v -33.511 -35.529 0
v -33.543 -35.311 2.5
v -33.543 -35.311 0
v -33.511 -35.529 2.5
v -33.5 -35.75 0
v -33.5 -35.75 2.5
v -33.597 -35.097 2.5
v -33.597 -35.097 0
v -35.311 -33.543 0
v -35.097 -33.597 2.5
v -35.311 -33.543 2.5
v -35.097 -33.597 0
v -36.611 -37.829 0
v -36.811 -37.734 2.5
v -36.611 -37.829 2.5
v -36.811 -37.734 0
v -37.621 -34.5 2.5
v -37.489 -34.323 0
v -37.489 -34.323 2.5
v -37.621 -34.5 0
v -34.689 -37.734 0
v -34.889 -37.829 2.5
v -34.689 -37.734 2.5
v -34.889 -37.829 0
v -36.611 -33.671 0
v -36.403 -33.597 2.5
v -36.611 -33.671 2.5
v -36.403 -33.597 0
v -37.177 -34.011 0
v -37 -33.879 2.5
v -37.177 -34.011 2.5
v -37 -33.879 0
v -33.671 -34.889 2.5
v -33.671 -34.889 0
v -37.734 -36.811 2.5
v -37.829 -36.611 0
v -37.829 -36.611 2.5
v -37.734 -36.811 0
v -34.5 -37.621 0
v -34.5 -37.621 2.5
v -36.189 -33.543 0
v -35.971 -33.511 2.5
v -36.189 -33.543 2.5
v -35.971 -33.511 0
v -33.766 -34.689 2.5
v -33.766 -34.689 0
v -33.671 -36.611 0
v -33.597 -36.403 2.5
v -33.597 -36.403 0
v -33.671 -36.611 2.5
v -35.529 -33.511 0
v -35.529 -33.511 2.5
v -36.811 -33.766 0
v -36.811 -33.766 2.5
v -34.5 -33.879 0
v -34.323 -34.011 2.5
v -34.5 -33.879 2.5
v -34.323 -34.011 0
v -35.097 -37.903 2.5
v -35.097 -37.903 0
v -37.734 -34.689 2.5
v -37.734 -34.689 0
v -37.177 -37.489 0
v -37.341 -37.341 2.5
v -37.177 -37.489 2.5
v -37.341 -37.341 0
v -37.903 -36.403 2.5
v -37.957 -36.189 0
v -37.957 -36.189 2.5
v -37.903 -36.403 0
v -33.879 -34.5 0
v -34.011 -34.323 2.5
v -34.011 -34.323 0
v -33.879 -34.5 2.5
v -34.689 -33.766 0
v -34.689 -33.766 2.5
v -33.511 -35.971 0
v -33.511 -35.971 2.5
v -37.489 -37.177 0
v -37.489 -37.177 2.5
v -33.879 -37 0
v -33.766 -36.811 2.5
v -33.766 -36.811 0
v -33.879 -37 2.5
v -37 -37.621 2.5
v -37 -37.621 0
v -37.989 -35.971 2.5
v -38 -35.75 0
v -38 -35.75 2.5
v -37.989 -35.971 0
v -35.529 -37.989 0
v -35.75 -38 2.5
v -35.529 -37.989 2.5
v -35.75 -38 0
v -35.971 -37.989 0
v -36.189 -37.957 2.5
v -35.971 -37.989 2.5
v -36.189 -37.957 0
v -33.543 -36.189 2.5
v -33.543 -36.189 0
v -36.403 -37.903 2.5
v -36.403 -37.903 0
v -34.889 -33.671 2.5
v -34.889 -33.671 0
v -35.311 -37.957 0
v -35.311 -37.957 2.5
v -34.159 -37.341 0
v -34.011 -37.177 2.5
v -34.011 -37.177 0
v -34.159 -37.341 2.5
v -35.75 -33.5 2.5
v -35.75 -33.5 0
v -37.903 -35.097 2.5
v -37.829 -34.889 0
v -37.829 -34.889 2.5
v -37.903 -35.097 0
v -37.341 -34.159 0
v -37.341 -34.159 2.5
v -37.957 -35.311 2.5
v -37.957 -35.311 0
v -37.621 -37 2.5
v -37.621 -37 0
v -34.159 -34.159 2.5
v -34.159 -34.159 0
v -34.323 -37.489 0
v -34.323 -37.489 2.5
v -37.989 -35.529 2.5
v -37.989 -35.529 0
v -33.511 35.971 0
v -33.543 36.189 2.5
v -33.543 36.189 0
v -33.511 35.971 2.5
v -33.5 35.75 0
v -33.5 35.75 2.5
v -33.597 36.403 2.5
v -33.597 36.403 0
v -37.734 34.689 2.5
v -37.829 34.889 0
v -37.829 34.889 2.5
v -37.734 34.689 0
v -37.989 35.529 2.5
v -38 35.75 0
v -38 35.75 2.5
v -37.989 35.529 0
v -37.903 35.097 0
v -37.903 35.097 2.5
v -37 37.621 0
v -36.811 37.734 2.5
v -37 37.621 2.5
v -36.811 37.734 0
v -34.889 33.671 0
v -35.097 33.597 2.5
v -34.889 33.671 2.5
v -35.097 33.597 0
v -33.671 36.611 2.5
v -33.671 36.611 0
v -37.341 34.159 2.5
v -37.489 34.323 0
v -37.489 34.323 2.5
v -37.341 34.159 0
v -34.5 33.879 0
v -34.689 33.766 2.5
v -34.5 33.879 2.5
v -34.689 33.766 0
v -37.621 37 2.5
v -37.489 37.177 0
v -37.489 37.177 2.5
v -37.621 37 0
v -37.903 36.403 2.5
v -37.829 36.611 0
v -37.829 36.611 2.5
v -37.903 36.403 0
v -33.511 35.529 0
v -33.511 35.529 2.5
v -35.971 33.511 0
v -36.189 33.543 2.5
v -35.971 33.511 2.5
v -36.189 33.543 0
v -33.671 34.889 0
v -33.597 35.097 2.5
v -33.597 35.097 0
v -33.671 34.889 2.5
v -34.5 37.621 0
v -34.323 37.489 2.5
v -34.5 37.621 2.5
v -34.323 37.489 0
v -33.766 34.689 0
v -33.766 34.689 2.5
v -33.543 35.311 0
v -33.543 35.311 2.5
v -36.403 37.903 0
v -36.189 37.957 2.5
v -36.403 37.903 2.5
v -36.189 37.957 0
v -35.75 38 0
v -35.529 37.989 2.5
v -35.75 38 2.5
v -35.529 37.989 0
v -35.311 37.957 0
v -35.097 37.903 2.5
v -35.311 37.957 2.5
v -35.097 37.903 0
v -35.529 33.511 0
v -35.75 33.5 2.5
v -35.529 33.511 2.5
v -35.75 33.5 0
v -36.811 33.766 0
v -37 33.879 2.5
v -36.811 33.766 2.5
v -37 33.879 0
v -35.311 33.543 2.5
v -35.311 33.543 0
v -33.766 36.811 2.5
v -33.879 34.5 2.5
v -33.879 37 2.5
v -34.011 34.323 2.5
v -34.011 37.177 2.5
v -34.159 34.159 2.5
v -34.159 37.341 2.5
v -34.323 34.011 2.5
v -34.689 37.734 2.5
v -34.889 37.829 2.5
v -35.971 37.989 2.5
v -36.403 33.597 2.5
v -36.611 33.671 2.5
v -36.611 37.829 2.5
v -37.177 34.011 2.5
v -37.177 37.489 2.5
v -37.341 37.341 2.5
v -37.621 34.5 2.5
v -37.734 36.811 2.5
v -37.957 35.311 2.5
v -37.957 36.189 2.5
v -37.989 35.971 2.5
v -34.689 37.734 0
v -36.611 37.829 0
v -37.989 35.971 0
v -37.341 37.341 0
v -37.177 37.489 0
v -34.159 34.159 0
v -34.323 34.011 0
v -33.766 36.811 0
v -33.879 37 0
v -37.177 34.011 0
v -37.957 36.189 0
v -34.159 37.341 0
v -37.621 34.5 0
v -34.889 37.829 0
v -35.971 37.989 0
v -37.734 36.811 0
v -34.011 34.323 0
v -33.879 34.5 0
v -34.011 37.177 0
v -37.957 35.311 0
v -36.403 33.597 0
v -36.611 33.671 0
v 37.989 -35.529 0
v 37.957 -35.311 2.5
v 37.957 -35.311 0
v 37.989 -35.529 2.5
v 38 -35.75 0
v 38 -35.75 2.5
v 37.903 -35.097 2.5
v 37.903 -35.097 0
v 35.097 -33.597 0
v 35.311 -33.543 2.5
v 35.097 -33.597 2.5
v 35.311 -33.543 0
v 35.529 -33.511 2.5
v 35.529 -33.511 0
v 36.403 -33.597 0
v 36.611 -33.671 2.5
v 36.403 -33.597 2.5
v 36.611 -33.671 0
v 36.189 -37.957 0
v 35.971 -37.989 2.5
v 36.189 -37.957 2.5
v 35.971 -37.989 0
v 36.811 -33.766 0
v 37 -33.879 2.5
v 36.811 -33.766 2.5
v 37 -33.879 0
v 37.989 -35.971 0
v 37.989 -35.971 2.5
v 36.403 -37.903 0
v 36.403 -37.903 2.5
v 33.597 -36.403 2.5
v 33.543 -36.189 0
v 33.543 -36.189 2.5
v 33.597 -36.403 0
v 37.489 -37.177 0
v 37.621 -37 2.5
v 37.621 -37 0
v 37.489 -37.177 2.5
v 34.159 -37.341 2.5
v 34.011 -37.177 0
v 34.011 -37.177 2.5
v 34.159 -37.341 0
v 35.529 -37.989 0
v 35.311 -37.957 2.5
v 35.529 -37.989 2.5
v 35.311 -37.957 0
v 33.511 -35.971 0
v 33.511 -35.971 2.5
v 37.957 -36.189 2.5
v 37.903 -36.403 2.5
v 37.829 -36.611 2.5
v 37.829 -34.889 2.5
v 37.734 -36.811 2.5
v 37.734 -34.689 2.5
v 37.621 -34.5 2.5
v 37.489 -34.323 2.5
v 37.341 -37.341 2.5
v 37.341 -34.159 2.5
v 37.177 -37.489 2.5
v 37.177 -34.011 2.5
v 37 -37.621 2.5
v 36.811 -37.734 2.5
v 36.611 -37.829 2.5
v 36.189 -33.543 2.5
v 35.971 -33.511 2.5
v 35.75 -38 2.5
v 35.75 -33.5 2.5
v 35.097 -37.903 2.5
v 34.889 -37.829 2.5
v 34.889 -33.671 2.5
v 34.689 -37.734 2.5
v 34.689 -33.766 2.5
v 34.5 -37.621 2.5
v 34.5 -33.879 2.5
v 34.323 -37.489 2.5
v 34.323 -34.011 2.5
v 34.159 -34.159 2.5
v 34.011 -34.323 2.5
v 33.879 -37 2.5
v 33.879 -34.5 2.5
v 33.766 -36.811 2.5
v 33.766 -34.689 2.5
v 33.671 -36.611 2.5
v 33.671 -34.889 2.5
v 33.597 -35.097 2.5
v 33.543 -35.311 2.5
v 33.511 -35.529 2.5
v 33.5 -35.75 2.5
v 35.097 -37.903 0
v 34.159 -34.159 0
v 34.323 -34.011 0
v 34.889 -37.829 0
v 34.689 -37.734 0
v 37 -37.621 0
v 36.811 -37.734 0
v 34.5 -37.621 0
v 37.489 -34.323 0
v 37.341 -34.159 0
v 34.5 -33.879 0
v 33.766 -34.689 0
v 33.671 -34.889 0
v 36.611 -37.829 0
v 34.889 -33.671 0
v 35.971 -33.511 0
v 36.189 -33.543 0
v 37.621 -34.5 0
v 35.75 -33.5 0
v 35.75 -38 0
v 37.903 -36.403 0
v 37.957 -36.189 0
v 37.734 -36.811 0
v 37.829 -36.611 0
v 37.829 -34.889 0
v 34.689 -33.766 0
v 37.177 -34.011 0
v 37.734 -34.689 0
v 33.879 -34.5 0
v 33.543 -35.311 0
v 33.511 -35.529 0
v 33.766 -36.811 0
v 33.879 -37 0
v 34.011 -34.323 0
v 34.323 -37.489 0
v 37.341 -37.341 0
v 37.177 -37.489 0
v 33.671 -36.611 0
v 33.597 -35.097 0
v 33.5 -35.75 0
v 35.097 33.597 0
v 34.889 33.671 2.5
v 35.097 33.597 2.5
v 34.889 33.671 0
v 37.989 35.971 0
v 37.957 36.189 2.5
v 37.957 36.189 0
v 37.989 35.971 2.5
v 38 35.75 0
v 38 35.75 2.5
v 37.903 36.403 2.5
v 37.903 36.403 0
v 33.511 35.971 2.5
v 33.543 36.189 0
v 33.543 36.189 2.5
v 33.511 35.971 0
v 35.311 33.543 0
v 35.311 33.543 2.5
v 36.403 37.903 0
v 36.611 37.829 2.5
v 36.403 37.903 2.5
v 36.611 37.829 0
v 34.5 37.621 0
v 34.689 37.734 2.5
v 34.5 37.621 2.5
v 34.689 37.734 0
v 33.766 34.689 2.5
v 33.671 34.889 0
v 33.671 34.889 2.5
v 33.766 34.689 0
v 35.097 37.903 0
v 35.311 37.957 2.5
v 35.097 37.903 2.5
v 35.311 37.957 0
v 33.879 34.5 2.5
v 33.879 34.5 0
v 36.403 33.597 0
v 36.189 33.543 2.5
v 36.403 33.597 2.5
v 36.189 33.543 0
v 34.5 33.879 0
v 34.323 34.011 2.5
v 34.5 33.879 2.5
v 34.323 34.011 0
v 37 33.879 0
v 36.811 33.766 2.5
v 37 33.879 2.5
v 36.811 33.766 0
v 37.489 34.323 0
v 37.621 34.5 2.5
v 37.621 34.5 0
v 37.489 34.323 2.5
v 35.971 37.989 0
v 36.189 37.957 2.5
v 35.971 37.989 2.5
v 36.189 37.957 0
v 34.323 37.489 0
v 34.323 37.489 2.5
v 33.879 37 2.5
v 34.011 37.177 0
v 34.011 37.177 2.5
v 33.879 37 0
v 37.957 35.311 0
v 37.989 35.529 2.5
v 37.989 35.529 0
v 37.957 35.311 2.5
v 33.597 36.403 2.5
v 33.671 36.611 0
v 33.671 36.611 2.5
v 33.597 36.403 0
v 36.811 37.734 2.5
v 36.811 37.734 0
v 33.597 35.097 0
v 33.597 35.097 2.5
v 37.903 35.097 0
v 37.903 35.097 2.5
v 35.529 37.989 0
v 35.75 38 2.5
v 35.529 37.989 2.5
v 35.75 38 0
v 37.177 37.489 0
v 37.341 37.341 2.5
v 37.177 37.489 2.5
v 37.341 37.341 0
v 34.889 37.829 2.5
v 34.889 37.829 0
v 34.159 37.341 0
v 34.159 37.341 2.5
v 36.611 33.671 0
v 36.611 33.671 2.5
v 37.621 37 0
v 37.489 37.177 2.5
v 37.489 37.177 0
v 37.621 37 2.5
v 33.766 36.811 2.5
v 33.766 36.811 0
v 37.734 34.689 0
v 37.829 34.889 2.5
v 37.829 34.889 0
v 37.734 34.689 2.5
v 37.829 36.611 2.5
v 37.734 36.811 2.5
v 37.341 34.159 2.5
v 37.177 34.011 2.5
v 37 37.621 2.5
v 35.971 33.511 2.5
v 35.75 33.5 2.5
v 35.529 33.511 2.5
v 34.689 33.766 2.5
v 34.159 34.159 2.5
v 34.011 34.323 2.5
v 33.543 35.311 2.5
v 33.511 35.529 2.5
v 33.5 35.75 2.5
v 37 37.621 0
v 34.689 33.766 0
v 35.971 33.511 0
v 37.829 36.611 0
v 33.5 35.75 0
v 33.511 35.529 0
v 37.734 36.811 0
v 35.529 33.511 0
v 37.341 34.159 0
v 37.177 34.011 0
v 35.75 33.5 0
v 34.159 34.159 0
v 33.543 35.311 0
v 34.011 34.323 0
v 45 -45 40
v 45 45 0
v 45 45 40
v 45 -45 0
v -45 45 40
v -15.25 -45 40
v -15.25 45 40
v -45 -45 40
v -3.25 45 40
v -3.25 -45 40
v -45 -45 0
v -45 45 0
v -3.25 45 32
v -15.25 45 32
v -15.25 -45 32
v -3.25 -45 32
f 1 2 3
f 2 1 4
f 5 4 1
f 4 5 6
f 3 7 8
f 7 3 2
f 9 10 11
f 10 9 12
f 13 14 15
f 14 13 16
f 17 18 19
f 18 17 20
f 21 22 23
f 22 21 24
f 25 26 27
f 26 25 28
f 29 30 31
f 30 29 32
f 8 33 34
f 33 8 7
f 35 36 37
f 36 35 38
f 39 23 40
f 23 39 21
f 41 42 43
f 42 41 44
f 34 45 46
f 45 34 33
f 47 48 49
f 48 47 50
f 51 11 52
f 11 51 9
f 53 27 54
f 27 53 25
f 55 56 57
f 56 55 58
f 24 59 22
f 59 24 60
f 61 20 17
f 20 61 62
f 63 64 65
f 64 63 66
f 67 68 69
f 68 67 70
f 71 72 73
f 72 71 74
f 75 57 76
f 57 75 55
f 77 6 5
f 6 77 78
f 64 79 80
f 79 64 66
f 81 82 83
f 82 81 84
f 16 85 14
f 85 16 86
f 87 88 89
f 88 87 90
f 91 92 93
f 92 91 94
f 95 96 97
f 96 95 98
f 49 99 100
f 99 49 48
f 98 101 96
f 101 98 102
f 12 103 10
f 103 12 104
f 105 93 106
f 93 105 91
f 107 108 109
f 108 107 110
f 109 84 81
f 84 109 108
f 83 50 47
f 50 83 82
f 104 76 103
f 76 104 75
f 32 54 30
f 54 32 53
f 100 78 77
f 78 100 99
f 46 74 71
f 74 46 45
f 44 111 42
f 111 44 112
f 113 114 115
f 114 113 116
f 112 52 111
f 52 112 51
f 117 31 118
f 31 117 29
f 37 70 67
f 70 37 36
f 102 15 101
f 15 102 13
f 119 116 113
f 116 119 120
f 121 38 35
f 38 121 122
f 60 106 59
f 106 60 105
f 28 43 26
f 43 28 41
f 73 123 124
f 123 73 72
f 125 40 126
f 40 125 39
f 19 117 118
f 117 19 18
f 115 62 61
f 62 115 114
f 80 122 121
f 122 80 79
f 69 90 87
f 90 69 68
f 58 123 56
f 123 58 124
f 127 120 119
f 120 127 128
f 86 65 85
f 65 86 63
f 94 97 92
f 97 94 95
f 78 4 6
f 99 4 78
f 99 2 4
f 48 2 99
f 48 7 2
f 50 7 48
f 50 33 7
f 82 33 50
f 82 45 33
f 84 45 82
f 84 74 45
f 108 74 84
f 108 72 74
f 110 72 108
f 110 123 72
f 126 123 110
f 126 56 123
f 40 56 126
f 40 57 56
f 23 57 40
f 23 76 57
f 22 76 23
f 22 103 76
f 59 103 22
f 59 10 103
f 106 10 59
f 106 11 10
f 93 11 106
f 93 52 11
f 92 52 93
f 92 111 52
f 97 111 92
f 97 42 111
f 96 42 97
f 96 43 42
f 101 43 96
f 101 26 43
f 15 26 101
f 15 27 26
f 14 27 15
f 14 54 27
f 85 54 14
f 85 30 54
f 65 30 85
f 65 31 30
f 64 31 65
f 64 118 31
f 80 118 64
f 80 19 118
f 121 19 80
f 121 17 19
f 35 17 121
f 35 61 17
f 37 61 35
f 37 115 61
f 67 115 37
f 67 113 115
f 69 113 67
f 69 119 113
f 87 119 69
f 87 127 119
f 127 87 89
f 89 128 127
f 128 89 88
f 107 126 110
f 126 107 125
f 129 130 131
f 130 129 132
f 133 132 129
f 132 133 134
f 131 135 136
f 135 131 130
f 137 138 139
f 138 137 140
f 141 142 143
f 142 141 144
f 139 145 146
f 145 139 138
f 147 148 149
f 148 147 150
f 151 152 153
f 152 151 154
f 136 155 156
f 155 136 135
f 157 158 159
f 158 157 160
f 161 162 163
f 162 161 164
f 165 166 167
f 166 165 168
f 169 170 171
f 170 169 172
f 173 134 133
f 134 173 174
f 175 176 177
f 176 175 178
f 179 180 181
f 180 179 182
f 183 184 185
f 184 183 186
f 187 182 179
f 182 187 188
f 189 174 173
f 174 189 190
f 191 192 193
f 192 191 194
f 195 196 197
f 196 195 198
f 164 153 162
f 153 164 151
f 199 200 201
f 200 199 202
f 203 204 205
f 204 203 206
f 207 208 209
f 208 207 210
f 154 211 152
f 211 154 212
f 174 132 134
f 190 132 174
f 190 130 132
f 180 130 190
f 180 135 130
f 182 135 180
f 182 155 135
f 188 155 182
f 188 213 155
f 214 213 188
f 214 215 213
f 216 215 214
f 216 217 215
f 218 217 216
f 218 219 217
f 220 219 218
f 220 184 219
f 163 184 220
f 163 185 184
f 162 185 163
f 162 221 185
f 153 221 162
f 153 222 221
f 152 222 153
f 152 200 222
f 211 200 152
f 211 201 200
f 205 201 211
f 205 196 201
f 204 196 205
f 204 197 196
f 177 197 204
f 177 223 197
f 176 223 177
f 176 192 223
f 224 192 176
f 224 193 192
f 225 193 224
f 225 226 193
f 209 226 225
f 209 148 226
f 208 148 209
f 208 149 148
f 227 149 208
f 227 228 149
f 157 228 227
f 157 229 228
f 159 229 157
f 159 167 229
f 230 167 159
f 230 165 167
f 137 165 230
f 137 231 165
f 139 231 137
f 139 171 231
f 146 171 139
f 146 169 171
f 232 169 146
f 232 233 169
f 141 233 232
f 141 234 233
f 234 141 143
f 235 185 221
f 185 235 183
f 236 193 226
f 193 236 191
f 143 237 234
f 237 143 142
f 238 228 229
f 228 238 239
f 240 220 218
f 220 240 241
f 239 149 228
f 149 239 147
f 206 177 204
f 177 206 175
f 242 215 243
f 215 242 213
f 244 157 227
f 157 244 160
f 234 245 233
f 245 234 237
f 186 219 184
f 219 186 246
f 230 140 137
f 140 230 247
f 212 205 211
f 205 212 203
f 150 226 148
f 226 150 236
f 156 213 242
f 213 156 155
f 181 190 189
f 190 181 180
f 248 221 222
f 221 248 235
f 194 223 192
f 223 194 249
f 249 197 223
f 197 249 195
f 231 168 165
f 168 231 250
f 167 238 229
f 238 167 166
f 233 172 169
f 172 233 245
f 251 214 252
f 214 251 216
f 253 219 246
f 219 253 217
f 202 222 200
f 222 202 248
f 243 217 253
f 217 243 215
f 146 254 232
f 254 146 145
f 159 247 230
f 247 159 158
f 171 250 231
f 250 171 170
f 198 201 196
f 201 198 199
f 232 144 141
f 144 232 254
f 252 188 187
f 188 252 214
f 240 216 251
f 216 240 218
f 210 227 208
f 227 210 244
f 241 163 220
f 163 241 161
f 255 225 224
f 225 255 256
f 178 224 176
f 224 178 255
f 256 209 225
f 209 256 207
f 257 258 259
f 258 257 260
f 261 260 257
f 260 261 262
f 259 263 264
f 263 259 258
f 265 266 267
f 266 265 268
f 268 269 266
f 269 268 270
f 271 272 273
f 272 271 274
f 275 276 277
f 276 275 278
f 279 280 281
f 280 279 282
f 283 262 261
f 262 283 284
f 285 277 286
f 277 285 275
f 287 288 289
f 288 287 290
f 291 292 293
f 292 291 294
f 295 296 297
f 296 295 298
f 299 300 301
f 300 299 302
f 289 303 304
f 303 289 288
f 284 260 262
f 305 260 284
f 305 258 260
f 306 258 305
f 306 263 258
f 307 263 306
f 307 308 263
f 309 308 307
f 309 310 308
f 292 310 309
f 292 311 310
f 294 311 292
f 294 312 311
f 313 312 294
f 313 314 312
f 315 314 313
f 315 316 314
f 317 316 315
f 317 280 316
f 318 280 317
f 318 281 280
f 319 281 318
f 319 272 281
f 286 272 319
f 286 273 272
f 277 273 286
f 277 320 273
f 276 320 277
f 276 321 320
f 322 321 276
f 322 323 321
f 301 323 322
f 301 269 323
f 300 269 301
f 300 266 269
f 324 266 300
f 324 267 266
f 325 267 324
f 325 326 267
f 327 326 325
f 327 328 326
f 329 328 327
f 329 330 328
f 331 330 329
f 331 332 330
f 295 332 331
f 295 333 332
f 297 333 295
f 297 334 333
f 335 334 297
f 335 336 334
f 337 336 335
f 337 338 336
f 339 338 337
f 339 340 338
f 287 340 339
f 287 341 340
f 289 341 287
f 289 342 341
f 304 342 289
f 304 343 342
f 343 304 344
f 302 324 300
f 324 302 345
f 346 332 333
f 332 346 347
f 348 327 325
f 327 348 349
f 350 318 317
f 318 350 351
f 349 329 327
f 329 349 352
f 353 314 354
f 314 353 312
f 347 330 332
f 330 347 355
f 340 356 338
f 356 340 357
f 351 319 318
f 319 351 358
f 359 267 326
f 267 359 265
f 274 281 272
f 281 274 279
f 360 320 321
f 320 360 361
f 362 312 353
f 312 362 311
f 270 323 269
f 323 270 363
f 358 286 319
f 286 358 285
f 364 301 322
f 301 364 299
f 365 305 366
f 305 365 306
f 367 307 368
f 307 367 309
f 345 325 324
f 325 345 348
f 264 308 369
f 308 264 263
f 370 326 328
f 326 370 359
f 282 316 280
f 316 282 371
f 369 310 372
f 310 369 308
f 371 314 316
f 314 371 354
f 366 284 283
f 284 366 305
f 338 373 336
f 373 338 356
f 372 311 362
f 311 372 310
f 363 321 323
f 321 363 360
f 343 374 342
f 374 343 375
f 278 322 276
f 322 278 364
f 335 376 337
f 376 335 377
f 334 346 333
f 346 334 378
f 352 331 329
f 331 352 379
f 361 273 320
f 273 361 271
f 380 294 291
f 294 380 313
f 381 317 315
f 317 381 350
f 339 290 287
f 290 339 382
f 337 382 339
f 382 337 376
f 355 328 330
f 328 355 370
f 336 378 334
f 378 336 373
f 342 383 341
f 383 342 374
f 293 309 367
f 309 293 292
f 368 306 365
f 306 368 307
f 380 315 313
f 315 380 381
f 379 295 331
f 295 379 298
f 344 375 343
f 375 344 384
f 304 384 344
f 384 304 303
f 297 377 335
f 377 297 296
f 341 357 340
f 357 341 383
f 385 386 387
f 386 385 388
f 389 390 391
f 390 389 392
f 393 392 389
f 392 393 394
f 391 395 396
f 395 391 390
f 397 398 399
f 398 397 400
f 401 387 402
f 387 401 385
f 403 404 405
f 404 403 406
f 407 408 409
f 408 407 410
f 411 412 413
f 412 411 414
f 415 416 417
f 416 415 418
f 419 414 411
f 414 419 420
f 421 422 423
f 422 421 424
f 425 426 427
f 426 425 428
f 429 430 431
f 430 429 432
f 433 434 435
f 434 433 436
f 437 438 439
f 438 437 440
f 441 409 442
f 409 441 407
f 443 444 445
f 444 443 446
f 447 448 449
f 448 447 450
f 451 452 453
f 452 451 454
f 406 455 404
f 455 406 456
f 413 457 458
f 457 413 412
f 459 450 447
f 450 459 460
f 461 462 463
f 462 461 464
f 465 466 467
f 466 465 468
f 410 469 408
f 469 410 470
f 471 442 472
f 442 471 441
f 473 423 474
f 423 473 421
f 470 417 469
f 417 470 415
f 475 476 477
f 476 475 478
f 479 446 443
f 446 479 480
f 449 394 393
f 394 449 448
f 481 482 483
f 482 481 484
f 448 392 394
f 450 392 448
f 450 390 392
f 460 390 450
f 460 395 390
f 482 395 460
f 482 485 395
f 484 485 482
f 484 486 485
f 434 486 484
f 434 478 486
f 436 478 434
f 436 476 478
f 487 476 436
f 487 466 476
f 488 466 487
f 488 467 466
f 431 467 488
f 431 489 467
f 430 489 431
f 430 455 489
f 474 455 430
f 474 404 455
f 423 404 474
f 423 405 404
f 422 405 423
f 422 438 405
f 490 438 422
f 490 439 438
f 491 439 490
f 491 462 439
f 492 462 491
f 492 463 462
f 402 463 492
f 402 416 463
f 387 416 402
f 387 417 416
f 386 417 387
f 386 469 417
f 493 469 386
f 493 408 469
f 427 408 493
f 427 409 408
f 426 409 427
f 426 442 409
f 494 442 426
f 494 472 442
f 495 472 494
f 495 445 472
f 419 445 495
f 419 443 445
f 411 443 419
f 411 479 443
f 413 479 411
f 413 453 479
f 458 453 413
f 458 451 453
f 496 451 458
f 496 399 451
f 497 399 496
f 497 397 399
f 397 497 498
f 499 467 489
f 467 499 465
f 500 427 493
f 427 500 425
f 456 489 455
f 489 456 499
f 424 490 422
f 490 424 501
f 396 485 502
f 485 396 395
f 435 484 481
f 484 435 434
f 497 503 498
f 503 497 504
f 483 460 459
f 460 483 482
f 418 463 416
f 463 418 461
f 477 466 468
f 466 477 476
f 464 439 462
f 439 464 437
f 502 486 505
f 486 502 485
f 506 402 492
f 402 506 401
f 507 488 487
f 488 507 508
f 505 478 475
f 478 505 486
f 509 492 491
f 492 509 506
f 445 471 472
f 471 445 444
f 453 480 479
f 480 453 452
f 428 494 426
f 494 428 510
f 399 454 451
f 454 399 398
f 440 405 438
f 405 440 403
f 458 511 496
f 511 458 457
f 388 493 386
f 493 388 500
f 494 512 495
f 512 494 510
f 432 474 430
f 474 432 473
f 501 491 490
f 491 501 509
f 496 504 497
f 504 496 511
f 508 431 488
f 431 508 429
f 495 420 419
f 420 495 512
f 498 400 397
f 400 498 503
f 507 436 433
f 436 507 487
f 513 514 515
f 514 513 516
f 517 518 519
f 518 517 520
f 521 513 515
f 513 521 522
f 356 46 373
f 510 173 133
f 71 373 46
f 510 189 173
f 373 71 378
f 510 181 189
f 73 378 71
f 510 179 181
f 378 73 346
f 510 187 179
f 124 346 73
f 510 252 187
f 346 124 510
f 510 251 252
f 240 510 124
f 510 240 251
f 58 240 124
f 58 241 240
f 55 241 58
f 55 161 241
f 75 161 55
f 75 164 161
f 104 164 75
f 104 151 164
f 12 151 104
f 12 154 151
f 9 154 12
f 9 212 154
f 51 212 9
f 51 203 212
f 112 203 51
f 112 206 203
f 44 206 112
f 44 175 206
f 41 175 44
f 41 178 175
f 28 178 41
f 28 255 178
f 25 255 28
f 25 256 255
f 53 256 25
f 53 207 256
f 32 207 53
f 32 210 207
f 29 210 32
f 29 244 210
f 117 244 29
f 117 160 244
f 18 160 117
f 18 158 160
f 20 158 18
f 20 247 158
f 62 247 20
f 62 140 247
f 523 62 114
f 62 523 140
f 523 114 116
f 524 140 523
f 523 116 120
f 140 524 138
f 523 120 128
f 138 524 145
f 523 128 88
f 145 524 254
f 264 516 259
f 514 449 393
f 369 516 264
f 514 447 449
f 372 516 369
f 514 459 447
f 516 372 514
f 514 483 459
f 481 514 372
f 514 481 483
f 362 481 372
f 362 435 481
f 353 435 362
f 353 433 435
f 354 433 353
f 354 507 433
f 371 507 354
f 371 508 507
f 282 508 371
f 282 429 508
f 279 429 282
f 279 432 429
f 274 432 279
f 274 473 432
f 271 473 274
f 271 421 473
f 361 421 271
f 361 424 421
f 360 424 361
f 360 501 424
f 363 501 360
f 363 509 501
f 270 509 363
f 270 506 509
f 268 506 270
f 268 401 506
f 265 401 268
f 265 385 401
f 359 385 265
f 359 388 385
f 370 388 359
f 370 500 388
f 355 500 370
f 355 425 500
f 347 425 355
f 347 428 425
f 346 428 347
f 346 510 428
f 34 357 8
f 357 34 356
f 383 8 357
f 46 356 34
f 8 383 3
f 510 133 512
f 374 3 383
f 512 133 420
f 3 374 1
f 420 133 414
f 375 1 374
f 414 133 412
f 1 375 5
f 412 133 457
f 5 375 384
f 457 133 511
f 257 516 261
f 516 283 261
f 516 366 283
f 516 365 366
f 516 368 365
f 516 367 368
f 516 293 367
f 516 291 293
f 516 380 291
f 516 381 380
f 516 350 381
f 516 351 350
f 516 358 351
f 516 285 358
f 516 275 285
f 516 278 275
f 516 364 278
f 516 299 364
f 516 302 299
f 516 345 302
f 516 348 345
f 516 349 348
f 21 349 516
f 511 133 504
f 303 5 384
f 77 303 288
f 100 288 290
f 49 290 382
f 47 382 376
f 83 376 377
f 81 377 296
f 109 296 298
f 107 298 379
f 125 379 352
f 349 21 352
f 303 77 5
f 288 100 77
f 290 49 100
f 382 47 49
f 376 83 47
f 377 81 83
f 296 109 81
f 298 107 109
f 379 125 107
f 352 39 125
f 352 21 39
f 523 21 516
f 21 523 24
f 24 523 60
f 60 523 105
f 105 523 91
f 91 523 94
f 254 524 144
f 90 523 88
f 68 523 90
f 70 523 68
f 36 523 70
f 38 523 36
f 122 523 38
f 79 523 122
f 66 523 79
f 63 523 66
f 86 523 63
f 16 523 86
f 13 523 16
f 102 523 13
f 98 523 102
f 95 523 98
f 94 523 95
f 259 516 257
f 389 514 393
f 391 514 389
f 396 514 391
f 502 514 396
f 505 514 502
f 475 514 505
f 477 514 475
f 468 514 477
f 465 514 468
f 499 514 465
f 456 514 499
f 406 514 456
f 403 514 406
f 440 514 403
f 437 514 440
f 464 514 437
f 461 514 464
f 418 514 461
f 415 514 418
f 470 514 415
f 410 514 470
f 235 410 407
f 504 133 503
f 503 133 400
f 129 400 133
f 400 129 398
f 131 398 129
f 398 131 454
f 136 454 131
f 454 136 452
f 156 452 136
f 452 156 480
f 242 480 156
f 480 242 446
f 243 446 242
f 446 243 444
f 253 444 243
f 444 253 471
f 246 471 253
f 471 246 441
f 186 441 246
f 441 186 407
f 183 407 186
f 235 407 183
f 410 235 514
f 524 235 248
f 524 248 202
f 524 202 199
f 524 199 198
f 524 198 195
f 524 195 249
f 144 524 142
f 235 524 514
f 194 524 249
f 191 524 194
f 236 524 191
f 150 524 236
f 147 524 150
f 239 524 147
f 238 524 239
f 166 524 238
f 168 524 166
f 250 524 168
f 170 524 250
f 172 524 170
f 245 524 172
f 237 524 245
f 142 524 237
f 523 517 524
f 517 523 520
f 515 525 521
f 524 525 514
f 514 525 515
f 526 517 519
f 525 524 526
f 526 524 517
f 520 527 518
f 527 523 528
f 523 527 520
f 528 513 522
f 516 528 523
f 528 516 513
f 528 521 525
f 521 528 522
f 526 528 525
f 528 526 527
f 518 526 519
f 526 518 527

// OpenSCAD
// Magnetic stirrer housing for 80 mm PC case fan
// Print orientation: top plate on bed (z = 0), walls build upward (+Z)

// ---------- Dimensions ----------
plate_t      = 2;     // top plate thickness
wall_t       = 2.5;   // wall thickness
box_h        = 40;    // outer wall height (open top at z = 40)
outer_x      = 90;    // outer size in X
outer_y      = 90;    // outer size in Y
hole_d       = 4.5;   // M4 screw hole diameter
hole_pitch   = 71.5;  // square pattern centre-to-centre
notch_w      = 12;    // cable notch width
notch_depth  = 8;     // notch depth from open edge (z = 32 to 40)
eps          = 0.5;   // cutter overshoot past faces

$fn = 64;

// ---------- Model ----------
difference() {
    // Solid outer block
    translate([-outer_x / 2, -outer_y / 2, 0])
        cube([outer_x, outer_y, box_h]);

    // Fan mounting holes through top plate
    for (sx = [-1, 1], sy = [-1, 1])
        translate([sx * hole_pitch / 2, sy * hole_pitch / 2, -eps])
            cylinder(d = hole_d, h = plate_t + 2 * eps);

    // Cable notch in one wall (along +X, centred)
    translate([-outer_x / 2 + hole_pitch / 2 - notch_w / 2,
               -outer_y / 2,
               box_h - notch_depth])
        cube([notch_w, outer_y + 2 * eps, notch_depth + eps]);
}
